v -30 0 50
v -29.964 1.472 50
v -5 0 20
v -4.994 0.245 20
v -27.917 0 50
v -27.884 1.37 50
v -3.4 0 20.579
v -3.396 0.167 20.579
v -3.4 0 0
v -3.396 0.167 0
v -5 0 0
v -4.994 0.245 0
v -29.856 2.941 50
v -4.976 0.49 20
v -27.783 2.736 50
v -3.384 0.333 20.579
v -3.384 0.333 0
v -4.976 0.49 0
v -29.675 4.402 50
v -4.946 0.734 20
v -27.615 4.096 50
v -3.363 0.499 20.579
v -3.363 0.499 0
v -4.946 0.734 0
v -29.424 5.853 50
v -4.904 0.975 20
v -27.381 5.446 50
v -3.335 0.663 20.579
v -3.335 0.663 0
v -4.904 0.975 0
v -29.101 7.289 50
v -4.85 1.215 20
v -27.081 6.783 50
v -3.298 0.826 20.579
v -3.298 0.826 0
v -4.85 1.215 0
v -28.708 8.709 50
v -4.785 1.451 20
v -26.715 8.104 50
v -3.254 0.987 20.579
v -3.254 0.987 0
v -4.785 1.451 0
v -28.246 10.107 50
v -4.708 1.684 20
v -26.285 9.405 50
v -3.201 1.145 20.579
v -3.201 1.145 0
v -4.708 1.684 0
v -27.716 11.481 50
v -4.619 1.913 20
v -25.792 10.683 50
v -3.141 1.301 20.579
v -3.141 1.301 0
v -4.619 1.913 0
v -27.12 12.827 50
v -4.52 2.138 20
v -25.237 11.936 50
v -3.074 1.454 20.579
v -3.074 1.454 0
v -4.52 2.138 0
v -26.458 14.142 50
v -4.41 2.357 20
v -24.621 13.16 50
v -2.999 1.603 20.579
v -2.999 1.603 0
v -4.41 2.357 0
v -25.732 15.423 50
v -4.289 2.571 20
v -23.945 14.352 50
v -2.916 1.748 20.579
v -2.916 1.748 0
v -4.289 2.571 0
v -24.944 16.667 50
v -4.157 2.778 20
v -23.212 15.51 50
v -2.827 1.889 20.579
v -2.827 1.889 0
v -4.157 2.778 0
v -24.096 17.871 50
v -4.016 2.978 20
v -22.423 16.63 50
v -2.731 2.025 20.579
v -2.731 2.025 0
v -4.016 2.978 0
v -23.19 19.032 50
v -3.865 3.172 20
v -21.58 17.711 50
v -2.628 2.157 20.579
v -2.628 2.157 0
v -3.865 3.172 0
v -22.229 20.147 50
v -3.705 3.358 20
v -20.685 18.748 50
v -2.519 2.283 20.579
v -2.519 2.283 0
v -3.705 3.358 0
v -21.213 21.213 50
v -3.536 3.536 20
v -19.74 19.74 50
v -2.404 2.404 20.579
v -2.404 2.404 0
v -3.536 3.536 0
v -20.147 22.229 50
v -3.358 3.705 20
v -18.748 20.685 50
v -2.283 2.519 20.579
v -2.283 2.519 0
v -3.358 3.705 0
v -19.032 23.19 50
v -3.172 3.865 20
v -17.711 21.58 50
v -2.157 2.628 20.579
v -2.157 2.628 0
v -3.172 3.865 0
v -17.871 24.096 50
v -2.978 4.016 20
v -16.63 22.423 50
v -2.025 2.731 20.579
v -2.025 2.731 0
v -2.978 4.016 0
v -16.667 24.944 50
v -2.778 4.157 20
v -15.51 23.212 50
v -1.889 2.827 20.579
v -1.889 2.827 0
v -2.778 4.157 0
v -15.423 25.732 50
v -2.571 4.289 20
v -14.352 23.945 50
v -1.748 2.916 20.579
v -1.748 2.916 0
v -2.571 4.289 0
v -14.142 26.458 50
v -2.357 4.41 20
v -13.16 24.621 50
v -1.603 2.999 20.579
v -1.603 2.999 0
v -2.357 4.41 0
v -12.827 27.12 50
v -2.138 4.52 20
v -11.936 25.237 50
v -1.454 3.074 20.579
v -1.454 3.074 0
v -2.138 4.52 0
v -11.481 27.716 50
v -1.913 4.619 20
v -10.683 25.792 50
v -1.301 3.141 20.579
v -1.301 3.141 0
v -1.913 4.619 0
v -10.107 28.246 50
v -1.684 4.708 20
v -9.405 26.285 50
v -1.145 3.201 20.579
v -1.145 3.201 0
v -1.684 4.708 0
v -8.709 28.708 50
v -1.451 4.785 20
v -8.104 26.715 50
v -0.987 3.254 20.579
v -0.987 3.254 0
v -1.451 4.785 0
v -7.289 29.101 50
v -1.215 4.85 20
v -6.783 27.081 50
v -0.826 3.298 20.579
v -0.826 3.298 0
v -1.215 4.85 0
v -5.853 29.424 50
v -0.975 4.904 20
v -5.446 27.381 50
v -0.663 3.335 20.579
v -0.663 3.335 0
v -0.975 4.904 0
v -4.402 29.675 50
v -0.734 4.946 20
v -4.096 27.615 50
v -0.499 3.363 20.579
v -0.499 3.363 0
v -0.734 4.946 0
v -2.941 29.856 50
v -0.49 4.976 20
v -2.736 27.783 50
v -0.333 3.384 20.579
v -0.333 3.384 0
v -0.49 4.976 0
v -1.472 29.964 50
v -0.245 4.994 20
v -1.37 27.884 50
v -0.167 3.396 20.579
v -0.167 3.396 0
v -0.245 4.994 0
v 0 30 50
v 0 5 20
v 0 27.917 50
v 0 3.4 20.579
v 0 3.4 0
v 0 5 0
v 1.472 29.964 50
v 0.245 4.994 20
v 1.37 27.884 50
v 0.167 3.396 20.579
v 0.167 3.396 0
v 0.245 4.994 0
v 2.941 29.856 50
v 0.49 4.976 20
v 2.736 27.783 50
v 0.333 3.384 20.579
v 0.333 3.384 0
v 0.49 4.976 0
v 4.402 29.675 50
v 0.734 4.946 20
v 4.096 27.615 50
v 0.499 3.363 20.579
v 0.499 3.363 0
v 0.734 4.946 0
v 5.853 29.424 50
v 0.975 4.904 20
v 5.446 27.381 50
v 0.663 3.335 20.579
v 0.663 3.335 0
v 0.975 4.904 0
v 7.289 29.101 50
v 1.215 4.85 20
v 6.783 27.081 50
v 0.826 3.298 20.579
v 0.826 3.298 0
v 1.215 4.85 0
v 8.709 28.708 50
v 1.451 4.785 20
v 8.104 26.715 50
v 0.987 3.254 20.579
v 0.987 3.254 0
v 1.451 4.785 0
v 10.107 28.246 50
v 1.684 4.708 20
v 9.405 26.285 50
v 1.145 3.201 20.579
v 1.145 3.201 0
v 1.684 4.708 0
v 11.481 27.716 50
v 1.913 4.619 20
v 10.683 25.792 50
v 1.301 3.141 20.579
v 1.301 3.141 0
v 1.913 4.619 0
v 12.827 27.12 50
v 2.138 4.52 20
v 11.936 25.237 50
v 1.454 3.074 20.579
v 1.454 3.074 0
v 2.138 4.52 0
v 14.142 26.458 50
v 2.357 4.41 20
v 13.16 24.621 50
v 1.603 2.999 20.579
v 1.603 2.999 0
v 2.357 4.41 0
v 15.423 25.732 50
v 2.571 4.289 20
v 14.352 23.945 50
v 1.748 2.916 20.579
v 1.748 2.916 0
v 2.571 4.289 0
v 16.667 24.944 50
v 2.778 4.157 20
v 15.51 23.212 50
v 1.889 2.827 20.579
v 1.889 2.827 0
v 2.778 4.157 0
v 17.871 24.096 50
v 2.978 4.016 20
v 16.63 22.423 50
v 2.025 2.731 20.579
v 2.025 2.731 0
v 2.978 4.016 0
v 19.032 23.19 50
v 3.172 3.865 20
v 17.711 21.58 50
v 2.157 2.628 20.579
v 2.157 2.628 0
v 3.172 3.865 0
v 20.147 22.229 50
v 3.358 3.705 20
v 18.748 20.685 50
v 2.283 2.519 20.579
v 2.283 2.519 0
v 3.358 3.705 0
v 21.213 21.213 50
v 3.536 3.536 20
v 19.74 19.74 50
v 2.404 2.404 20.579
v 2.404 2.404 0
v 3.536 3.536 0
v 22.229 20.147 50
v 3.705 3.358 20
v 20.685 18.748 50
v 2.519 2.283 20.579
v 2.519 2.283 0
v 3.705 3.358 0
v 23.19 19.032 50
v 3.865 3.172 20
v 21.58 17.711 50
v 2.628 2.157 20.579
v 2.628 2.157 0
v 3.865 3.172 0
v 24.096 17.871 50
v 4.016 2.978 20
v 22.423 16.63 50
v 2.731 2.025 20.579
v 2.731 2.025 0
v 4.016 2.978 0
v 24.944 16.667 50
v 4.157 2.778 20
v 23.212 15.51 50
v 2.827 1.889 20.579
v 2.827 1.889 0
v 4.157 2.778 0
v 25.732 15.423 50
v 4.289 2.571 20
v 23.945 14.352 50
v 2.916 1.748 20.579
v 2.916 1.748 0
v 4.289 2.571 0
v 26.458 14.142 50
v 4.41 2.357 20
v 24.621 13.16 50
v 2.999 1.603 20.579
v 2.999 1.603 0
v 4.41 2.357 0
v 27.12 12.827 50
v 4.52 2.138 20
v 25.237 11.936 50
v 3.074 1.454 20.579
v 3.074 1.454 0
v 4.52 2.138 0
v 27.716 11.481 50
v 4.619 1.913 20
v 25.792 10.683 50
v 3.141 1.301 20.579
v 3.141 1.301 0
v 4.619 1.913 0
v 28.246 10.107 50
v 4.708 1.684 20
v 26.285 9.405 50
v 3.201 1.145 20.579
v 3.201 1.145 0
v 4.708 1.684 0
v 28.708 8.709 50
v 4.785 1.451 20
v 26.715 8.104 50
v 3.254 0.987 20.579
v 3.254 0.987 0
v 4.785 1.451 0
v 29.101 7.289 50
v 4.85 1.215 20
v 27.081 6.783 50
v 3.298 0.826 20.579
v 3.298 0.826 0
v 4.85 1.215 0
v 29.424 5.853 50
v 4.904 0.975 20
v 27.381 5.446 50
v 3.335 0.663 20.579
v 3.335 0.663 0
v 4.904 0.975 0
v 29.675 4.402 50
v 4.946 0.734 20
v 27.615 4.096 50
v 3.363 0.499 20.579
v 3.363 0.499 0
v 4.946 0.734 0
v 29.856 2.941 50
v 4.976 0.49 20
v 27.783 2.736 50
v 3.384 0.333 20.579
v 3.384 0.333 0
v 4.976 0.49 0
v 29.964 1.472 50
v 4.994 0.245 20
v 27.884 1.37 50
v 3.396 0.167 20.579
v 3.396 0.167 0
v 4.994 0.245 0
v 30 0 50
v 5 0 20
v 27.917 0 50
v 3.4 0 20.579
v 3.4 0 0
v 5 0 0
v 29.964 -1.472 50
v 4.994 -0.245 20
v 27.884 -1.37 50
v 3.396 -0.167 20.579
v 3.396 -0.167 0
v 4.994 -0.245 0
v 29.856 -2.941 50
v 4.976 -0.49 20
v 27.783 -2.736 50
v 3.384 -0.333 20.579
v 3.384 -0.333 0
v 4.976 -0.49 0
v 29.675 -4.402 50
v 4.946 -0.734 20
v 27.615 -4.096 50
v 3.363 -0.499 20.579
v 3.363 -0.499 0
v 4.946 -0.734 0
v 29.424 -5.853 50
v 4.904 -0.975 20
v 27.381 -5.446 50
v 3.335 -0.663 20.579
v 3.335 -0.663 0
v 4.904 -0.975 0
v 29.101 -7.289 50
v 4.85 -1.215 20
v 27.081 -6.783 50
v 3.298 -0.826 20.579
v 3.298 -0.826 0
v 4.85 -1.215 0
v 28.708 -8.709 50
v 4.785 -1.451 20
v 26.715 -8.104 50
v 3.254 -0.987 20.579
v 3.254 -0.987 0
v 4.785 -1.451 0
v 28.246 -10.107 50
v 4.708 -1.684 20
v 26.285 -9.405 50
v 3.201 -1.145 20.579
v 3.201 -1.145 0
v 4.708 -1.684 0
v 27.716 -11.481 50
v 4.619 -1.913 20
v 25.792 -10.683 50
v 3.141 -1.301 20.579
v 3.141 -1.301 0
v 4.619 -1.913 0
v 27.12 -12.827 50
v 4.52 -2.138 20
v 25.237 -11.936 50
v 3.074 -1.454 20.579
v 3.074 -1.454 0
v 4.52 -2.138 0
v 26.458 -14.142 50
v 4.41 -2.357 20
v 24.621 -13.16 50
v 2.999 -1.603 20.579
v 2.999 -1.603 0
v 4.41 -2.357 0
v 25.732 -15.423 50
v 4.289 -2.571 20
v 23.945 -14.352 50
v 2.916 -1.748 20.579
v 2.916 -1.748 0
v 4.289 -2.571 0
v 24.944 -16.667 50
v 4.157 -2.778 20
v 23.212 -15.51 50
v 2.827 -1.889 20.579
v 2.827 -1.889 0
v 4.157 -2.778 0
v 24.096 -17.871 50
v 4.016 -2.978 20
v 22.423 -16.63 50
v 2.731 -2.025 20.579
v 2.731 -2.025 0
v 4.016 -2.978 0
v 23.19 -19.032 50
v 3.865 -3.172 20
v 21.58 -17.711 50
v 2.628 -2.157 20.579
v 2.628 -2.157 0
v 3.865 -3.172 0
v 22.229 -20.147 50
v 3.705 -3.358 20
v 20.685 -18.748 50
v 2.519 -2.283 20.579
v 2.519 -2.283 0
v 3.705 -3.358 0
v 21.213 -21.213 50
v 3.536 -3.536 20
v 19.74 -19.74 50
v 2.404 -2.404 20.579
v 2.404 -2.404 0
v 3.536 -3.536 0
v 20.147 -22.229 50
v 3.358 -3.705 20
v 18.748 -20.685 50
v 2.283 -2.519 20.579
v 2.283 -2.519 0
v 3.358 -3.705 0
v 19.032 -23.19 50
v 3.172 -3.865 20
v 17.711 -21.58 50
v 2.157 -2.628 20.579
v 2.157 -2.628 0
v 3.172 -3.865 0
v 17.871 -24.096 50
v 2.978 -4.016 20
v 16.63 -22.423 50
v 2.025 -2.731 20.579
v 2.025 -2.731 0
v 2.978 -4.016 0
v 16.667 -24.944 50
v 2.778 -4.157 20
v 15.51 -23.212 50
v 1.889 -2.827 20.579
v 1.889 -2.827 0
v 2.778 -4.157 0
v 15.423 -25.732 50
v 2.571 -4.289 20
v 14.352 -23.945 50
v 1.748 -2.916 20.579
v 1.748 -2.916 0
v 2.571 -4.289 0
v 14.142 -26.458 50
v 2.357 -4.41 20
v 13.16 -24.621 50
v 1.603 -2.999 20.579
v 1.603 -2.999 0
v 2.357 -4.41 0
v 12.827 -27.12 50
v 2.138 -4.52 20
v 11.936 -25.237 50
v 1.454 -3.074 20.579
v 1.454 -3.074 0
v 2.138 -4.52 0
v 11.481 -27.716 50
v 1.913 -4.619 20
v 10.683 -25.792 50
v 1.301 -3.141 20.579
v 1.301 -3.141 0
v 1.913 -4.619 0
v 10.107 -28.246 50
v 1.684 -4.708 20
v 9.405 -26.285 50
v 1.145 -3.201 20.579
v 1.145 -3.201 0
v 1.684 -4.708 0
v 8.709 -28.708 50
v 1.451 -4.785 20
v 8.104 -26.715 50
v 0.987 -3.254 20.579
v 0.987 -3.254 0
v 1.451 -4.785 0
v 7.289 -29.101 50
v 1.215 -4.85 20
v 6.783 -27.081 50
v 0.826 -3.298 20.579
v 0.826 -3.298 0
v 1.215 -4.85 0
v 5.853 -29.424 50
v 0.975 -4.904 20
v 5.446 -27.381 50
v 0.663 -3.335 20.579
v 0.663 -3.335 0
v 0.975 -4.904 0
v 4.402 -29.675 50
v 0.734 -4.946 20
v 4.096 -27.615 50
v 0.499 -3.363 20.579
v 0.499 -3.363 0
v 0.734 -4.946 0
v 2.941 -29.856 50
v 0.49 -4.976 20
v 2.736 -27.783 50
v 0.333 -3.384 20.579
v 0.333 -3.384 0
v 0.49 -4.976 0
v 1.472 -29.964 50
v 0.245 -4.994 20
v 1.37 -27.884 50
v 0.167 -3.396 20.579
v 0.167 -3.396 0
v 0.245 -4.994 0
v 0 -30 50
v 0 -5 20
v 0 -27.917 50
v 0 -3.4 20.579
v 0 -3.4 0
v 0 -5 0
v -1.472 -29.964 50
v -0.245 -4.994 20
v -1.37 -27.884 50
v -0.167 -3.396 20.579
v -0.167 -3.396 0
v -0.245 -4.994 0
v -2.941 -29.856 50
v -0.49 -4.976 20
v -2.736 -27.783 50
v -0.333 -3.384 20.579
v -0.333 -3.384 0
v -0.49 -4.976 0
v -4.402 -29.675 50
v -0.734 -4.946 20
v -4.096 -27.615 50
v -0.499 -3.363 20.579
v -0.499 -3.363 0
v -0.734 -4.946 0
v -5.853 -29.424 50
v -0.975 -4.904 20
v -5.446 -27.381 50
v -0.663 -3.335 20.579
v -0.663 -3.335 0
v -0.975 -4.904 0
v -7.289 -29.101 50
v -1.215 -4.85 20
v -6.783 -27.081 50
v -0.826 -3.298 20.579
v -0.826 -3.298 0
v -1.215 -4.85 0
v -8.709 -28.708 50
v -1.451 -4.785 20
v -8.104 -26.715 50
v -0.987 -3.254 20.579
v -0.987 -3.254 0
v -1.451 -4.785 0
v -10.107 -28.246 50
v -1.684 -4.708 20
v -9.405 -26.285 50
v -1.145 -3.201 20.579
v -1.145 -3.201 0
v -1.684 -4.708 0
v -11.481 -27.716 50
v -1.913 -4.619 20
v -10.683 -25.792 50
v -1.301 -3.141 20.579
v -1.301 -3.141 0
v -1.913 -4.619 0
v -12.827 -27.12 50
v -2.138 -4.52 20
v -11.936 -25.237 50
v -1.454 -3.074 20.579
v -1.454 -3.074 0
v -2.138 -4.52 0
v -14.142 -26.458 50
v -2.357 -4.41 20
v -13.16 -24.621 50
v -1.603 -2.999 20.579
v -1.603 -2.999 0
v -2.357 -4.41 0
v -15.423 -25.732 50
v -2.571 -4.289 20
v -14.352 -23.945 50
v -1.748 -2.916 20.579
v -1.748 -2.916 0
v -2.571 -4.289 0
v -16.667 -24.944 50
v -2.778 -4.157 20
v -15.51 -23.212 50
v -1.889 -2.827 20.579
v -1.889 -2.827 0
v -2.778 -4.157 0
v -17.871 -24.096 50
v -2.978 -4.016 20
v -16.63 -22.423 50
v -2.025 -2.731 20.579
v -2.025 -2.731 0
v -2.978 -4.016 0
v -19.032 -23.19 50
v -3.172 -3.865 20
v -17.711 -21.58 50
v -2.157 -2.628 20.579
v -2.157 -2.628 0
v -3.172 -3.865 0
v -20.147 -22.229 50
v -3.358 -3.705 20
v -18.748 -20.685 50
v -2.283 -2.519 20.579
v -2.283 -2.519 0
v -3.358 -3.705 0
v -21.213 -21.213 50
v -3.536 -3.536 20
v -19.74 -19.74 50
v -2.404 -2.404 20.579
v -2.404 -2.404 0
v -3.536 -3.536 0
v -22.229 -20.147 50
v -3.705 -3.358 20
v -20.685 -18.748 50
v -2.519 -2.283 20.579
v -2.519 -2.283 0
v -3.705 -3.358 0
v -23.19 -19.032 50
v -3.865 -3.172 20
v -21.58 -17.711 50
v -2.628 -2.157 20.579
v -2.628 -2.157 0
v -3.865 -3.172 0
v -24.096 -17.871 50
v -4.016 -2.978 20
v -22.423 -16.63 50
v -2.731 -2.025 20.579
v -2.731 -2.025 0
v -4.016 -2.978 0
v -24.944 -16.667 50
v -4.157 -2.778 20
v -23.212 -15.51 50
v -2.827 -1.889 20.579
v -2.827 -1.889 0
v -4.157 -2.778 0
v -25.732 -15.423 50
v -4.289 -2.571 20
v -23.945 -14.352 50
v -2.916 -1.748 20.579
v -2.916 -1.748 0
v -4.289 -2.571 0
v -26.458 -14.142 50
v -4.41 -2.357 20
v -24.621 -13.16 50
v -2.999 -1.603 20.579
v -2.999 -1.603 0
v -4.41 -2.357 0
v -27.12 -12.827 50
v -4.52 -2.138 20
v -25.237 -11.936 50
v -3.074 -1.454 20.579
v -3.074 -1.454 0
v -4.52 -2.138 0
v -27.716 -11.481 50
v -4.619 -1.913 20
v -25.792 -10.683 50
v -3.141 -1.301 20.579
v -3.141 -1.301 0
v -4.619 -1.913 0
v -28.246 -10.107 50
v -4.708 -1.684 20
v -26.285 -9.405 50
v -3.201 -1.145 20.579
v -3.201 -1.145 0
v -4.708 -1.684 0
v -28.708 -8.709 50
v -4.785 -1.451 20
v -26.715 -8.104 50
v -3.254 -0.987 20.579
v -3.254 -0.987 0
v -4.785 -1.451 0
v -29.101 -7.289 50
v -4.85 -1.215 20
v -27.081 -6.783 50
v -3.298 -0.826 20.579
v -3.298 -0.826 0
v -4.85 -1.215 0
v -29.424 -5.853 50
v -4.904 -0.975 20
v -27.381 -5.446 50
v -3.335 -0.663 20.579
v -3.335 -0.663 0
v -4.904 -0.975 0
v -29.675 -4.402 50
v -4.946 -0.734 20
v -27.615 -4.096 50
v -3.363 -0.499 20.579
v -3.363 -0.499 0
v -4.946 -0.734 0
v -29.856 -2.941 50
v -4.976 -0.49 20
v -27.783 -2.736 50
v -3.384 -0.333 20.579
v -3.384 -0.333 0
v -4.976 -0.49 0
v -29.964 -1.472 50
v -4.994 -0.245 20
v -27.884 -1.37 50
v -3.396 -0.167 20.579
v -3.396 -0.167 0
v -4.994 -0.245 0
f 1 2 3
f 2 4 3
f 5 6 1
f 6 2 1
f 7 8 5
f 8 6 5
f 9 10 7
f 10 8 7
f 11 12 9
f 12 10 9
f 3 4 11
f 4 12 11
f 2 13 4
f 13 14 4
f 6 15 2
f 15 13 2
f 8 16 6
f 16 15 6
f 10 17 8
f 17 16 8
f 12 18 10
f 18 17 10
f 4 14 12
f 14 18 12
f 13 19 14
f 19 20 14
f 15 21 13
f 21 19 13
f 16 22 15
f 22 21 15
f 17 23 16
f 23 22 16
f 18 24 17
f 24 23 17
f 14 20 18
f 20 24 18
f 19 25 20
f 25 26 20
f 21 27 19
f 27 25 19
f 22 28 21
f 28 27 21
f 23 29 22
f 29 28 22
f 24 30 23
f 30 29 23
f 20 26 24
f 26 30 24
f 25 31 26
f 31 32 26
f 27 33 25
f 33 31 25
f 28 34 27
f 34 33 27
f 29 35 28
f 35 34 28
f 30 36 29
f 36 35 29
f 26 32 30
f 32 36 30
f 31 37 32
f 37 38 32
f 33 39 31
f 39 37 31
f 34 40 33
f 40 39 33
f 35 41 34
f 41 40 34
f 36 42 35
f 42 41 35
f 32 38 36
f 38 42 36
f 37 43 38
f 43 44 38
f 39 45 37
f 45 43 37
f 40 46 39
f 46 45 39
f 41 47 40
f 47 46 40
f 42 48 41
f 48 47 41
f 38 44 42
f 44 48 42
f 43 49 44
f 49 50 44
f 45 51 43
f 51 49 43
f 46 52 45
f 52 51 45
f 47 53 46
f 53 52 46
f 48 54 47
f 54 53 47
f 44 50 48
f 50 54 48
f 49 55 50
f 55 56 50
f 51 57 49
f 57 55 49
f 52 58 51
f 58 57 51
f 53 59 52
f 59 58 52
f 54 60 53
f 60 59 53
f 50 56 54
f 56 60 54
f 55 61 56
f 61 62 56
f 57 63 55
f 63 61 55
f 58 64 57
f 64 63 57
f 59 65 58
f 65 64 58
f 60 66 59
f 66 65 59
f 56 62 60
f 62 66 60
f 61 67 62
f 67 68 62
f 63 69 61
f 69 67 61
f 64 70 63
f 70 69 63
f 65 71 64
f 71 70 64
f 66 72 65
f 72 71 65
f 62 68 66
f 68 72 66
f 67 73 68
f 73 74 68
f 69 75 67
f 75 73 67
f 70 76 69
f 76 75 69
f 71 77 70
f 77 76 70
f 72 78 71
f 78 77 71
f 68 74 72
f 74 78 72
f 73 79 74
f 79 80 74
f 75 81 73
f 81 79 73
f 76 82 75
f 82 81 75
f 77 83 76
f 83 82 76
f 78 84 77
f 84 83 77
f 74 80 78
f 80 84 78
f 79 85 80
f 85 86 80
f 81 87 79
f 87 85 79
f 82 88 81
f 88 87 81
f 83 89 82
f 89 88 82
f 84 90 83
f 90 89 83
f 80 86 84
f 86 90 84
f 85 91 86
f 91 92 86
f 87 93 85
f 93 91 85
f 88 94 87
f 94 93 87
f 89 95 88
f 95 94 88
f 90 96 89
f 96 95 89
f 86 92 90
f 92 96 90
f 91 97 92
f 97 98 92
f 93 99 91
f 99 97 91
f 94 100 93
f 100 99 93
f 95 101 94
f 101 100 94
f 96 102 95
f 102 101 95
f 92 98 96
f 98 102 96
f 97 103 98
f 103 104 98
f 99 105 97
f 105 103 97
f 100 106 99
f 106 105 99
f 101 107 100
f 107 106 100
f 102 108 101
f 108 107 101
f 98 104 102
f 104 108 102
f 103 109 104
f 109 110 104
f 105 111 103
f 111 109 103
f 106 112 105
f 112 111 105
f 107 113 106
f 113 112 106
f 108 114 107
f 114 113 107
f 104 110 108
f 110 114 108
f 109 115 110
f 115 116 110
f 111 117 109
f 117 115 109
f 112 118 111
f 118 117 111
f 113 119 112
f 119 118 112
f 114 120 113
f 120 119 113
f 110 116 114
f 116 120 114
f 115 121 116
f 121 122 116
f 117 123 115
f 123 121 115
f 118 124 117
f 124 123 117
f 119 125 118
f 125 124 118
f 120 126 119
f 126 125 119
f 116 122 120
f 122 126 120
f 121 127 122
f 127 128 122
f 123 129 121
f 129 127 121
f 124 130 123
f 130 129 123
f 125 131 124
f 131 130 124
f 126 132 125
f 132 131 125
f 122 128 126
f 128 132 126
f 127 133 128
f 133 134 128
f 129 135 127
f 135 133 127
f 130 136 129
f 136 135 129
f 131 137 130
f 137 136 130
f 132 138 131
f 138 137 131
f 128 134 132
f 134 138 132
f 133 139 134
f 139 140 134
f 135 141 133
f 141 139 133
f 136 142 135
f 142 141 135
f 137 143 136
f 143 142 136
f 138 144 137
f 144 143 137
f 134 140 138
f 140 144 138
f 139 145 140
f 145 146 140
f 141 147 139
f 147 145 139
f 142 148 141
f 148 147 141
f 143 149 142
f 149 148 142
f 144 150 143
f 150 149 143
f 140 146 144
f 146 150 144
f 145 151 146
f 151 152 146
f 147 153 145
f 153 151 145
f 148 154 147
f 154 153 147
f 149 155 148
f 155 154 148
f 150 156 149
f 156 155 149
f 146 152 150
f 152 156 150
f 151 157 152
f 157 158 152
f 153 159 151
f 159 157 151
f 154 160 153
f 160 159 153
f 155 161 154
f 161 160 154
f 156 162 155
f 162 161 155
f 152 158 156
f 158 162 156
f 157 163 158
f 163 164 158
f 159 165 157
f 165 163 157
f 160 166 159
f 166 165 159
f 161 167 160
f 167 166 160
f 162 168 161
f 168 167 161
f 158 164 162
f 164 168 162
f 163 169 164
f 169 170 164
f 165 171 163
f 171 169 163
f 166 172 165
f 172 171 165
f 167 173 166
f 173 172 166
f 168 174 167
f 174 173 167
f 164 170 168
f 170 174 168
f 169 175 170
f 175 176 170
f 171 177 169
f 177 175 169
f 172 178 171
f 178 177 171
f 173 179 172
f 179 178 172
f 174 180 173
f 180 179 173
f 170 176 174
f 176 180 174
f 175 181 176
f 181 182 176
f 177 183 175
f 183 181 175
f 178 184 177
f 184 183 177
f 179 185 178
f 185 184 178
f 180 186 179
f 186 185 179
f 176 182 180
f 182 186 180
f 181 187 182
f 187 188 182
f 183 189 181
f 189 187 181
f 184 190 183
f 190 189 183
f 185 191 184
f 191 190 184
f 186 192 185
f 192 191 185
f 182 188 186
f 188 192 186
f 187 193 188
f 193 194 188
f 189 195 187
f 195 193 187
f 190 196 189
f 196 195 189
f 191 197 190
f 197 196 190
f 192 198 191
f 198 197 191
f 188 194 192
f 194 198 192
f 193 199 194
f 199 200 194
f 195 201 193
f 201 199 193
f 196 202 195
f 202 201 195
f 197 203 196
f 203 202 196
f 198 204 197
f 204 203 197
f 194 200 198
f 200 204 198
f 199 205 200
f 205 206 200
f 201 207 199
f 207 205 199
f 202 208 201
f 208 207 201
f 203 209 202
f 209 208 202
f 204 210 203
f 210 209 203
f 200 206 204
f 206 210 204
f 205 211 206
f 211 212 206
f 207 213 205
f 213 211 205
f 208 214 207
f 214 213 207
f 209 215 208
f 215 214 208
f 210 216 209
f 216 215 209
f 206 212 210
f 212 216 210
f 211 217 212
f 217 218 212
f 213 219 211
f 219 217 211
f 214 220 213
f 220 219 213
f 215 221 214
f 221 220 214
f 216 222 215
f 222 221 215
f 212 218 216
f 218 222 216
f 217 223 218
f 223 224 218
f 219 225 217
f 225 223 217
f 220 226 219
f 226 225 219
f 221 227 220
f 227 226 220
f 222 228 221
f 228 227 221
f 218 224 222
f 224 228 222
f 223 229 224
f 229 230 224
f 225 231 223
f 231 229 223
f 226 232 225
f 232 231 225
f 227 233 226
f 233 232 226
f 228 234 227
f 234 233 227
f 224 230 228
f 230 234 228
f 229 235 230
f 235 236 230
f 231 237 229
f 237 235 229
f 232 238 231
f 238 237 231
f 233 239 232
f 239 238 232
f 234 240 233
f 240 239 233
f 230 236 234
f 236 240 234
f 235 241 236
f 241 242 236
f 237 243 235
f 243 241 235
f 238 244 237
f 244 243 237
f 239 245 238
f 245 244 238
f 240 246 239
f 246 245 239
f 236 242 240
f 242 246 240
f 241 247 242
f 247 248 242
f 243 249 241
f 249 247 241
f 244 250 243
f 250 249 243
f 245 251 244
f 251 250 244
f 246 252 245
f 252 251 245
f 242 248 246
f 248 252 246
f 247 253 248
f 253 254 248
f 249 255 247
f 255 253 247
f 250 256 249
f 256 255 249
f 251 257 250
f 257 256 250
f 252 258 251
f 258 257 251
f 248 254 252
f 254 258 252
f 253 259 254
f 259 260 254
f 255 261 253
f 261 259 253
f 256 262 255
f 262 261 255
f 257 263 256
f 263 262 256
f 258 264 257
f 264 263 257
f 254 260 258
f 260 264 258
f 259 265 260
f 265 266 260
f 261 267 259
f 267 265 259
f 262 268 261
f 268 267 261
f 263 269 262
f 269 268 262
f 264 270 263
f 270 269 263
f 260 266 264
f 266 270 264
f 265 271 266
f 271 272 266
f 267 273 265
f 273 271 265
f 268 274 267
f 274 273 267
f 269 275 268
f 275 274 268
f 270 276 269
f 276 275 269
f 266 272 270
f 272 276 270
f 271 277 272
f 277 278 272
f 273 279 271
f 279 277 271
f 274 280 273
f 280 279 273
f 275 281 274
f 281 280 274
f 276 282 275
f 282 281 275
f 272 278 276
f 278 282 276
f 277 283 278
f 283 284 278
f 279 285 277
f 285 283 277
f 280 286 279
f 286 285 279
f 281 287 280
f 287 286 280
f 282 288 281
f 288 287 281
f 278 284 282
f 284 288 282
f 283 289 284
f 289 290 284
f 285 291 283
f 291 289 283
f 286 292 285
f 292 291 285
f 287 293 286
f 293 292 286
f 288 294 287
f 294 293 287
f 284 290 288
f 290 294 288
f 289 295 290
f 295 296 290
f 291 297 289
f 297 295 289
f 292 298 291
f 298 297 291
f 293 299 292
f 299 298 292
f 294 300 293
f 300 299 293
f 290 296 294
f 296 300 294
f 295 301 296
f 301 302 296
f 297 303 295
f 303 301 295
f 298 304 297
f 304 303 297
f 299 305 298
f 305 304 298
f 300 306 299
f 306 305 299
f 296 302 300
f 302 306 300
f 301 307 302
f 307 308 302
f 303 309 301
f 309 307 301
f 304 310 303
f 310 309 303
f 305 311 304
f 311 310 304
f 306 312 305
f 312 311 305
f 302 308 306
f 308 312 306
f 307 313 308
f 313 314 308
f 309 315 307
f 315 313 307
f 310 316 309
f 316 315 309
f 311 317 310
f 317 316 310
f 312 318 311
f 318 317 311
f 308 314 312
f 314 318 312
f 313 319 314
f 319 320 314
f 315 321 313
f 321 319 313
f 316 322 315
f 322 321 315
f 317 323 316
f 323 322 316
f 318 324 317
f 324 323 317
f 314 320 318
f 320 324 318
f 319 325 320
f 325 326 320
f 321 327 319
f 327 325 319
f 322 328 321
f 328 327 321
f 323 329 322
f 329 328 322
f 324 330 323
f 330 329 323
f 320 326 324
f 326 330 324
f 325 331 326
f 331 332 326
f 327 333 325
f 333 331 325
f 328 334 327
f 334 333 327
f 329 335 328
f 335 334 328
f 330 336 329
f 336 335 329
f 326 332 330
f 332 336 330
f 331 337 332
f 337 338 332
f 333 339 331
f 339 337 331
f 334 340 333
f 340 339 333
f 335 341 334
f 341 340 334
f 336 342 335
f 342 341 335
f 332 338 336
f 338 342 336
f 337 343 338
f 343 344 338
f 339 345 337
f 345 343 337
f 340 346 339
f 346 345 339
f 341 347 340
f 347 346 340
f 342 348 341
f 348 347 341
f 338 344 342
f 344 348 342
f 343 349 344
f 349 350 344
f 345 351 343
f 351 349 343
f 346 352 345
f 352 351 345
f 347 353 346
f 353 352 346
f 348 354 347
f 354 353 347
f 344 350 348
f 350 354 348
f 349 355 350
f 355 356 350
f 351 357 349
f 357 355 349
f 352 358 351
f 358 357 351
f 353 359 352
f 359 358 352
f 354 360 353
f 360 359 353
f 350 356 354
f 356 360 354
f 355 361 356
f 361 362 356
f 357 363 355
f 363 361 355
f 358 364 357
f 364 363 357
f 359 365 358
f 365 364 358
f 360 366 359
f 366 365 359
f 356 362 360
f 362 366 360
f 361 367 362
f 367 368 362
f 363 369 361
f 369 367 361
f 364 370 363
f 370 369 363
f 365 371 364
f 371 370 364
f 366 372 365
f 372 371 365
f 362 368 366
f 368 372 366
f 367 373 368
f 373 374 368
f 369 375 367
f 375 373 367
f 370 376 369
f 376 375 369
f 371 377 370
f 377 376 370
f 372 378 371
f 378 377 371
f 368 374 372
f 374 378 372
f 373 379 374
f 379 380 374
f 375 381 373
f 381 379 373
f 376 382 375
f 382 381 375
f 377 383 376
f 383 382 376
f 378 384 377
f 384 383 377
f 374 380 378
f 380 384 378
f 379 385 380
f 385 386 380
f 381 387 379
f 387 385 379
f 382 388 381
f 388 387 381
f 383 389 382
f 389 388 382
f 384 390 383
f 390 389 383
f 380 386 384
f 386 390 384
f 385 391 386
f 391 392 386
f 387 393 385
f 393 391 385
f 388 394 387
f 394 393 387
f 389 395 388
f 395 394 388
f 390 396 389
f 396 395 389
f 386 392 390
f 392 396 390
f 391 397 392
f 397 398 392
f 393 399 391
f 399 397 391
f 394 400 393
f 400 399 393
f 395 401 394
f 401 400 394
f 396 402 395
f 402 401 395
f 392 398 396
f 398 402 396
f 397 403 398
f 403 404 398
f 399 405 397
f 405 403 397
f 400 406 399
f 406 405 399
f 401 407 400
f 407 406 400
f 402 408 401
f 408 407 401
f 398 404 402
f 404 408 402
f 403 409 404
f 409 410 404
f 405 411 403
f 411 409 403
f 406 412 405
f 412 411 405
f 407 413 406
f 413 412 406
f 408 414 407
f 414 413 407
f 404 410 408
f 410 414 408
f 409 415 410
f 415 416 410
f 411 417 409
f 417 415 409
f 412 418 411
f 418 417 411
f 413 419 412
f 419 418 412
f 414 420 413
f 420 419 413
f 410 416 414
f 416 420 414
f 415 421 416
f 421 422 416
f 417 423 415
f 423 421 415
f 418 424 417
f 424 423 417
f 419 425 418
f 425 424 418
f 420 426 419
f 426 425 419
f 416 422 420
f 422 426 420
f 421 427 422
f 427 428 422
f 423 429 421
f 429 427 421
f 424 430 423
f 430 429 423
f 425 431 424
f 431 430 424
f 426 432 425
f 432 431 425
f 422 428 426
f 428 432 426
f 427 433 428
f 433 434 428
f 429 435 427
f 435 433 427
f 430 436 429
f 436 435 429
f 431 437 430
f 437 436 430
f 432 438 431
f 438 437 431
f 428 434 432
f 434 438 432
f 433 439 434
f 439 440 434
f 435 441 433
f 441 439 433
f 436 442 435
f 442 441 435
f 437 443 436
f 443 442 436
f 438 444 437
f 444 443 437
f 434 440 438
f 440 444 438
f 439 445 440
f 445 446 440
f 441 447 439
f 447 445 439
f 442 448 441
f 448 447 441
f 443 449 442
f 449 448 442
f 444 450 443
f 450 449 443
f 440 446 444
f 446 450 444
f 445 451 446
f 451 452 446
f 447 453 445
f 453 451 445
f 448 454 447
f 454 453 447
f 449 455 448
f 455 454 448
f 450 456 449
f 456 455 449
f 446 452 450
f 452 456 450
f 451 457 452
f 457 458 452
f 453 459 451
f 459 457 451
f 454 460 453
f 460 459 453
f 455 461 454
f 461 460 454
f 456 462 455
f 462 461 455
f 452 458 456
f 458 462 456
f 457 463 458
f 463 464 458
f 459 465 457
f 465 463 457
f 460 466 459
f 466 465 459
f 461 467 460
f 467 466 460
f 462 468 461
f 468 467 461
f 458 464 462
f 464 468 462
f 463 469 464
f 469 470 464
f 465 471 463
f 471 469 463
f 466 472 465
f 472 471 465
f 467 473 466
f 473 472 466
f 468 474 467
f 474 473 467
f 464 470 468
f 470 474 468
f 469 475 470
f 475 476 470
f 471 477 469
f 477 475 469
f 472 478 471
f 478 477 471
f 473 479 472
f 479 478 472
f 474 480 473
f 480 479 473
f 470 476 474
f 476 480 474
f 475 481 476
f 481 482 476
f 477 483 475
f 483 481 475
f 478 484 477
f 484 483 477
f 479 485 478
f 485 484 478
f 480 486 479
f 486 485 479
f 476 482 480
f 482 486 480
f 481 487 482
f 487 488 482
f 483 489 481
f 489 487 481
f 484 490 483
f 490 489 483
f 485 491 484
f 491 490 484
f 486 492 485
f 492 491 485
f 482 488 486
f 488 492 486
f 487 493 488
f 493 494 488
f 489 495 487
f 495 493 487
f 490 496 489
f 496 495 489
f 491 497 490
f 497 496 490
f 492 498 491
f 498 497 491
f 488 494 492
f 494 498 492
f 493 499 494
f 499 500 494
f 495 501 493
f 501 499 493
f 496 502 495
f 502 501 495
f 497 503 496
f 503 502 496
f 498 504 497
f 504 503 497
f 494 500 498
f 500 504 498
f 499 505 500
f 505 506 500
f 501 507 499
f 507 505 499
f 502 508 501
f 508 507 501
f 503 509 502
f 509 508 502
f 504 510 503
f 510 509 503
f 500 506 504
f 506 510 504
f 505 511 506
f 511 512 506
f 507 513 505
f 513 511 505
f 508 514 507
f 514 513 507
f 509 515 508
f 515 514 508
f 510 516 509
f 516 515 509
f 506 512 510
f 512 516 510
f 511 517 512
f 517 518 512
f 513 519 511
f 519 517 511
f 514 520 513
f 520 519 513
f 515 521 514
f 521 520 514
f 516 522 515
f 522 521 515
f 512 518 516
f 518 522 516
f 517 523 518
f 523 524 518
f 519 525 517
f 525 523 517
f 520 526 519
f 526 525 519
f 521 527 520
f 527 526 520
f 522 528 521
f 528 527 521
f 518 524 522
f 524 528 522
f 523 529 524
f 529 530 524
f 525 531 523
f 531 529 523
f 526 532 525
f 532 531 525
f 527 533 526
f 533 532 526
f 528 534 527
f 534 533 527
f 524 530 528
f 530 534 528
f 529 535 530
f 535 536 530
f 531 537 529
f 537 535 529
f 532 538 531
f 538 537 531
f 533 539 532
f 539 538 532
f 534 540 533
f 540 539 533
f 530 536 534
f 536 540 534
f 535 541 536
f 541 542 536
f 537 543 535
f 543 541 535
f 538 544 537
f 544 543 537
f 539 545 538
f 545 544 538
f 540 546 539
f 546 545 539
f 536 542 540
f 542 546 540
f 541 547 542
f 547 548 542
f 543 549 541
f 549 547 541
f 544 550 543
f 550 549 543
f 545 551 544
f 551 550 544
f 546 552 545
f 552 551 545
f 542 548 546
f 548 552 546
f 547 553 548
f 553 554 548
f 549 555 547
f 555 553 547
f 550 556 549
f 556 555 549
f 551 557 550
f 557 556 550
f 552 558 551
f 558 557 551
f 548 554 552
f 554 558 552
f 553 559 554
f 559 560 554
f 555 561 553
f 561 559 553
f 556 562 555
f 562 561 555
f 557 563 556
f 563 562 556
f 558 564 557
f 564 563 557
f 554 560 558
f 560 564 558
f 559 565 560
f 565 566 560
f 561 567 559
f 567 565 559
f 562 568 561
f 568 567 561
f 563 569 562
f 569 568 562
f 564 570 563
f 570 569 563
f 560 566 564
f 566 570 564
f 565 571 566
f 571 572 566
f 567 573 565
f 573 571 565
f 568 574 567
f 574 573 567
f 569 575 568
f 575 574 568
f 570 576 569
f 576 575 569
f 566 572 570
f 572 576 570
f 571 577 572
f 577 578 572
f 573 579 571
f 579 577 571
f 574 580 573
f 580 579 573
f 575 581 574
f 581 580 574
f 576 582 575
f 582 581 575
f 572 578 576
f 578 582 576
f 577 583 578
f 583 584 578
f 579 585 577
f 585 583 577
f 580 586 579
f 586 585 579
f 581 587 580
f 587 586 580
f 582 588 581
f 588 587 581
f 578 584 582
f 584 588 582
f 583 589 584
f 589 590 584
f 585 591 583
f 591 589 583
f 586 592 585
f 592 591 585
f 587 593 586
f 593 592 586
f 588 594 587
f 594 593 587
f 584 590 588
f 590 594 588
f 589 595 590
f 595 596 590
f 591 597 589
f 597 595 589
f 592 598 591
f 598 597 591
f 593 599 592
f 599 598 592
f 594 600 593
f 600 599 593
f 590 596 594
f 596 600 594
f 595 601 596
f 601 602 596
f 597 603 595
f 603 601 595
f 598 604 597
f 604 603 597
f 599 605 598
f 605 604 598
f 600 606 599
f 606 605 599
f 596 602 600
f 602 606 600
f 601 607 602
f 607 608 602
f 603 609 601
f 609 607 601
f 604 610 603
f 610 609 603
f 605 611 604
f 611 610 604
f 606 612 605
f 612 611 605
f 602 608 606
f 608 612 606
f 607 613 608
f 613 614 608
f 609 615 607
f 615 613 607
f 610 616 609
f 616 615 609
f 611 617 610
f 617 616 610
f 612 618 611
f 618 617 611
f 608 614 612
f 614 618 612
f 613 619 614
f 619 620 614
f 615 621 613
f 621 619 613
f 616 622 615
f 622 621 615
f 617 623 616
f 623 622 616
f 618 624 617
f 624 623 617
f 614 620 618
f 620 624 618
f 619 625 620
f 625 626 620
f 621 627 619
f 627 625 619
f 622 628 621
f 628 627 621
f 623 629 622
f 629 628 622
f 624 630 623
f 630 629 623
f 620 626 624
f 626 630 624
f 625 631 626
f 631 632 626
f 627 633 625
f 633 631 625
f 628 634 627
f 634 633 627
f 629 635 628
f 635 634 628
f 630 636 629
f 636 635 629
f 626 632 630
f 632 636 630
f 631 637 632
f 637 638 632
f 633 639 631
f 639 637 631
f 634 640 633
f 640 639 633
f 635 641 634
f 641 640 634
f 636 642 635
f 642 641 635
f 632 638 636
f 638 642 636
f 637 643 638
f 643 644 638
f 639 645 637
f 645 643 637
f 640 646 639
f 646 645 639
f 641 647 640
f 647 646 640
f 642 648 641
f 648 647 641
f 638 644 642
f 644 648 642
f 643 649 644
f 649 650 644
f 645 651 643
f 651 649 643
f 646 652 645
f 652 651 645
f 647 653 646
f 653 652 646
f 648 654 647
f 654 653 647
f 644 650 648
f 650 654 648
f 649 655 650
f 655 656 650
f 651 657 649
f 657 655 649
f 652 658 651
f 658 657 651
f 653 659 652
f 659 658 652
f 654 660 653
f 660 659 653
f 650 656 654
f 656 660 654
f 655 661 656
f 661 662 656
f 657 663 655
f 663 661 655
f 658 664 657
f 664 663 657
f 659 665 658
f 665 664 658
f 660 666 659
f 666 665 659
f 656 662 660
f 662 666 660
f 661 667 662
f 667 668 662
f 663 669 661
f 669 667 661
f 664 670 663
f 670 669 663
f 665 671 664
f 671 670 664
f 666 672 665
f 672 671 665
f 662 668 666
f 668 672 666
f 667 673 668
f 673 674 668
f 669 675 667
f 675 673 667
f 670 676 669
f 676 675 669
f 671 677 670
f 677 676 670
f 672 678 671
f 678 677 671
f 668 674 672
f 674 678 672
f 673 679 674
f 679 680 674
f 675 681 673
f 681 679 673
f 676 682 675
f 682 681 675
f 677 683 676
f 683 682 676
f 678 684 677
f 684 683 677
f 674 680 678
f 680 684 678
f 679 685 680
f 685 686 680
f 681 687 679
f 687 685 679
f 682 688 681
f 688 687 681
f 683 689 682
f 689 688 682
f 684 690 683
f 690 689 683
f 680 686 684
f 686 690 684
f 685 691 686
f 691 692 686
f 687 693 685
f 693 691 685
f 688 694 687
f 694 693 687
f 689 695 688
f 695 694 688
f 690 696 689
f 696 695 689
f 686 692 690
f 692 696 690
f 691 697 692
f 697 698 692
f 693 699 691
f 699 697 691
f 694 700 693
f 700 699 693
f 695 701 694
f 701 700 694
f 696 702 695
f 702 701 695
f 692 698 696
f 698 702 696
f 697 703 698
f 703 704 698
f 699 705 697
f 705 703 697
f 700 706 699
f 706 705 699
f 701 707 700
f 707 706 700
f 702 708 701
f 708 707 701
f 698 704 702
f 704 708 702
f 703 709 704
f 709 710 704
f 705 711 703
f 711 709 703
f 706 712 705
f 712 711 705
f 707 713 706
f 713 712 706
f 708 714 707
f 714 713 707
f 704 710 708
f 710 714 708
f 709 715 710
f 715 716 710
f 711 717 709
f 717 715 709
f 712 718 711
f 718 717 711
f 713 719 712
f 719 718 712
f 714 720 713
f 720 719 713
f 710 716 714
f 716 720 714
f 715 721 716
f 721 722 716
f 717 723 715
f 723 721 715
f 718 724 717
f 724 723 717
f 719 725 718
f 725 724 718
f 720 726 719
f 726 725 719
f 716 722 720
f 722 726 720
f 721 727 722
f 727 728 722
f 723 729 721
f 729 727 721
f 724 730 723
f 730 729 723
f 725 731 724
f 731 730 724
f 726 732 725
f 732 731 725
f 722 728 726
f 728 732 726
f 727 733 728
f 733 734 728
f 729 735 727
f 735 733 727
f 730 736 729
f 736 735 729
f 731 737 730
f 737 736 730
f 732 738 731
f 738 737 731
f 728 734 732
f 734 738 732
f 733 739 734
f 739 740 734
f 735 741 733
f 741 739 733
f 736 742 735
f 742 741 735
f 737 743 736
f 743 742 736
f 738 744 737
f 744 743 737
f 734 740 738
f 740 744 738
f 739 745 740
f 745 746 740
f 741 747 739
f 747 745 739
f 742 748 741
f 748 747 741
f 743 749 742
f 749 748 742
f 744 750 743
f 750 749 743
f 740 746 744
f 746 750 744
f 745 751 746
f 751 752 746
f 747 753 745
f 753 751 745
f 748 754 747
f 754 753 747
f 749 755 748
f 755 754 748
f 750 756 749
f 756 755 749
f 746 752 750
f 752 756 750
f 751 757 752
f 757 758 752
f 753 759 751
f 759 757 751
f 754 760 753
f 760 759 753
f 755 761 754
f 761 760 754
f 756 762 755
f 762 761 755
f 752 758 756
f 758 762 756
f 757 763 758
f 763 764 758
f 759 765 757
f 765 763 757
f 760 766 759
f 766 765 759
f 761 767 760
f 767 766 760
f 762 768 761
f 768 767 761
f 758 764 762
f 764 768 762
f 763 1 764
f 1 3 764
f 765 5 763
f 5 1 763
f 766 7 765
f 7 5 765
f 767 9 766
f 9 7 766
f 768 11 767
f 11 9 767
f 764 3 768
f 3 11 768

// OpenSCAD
// Small lab funnel - printed upright, wide opening at top
// Built as a single rotate_extrude of the wall cross-section,
// so the funnel is open at both ends.

$fn = 128;                 // smoothness of round surfaces

// ---- Dimensions (mm) ----
spout_od     = 10;         // spout outer diameter
spout_h      = 20;         // spout height (z = 0 .. 20)
rim_od       = 60;         // cone outer diameter at rim
total_h      = 50;         // rim height (top of funnel)
wall         = 1.6;        // wall thickness (normal to surface)

// ---- Derived values ----
ro_spout   = spout_od / 2;                 // 5.0  spout outer radius
ri_spout   = ro_spout - wall;              // 3.4  spout bore radius (6.8 mm bore)
ro_rim     = rim_od / 2;                   // 30.0 rim outer radius
cone_h     = total_h - spout_h;            // 30.0 cone height
slope      = (ro_rim - ro_spout) / cone_h; // radial growth per mm of height
cone_ang   = atan(slope);                  // cone half-angle from vertical
wall_h     = wall / cos(cone_ang);         // horizontal wall width in cone (keeps 1.6 mm normal thickness)
ri_rim     = ro_rim - wall_h;              // inner radius at rim

// Height where inner cone surface meets the spout bore
z_join     = spout_h + (ri_spout - (ro_spout - wall_h)) / slope;

// ---- Wall profile (r, z) revolved about Z ----
profile = [
    [ri_spout, 0],          // bore, bottom
    [ro_spout, 0],          // outside, bottom
    [ro_spout, spout_h],    // outside, top of spout
    [ro_rim,   total_h],    // outside, rim
    [ri_rim,   total_h],    // inside, rim
    [ri_spout, z_join]      // inside, cone meets bore
];

rotate_extrude(convexity = 4)
    polygon(profile);
